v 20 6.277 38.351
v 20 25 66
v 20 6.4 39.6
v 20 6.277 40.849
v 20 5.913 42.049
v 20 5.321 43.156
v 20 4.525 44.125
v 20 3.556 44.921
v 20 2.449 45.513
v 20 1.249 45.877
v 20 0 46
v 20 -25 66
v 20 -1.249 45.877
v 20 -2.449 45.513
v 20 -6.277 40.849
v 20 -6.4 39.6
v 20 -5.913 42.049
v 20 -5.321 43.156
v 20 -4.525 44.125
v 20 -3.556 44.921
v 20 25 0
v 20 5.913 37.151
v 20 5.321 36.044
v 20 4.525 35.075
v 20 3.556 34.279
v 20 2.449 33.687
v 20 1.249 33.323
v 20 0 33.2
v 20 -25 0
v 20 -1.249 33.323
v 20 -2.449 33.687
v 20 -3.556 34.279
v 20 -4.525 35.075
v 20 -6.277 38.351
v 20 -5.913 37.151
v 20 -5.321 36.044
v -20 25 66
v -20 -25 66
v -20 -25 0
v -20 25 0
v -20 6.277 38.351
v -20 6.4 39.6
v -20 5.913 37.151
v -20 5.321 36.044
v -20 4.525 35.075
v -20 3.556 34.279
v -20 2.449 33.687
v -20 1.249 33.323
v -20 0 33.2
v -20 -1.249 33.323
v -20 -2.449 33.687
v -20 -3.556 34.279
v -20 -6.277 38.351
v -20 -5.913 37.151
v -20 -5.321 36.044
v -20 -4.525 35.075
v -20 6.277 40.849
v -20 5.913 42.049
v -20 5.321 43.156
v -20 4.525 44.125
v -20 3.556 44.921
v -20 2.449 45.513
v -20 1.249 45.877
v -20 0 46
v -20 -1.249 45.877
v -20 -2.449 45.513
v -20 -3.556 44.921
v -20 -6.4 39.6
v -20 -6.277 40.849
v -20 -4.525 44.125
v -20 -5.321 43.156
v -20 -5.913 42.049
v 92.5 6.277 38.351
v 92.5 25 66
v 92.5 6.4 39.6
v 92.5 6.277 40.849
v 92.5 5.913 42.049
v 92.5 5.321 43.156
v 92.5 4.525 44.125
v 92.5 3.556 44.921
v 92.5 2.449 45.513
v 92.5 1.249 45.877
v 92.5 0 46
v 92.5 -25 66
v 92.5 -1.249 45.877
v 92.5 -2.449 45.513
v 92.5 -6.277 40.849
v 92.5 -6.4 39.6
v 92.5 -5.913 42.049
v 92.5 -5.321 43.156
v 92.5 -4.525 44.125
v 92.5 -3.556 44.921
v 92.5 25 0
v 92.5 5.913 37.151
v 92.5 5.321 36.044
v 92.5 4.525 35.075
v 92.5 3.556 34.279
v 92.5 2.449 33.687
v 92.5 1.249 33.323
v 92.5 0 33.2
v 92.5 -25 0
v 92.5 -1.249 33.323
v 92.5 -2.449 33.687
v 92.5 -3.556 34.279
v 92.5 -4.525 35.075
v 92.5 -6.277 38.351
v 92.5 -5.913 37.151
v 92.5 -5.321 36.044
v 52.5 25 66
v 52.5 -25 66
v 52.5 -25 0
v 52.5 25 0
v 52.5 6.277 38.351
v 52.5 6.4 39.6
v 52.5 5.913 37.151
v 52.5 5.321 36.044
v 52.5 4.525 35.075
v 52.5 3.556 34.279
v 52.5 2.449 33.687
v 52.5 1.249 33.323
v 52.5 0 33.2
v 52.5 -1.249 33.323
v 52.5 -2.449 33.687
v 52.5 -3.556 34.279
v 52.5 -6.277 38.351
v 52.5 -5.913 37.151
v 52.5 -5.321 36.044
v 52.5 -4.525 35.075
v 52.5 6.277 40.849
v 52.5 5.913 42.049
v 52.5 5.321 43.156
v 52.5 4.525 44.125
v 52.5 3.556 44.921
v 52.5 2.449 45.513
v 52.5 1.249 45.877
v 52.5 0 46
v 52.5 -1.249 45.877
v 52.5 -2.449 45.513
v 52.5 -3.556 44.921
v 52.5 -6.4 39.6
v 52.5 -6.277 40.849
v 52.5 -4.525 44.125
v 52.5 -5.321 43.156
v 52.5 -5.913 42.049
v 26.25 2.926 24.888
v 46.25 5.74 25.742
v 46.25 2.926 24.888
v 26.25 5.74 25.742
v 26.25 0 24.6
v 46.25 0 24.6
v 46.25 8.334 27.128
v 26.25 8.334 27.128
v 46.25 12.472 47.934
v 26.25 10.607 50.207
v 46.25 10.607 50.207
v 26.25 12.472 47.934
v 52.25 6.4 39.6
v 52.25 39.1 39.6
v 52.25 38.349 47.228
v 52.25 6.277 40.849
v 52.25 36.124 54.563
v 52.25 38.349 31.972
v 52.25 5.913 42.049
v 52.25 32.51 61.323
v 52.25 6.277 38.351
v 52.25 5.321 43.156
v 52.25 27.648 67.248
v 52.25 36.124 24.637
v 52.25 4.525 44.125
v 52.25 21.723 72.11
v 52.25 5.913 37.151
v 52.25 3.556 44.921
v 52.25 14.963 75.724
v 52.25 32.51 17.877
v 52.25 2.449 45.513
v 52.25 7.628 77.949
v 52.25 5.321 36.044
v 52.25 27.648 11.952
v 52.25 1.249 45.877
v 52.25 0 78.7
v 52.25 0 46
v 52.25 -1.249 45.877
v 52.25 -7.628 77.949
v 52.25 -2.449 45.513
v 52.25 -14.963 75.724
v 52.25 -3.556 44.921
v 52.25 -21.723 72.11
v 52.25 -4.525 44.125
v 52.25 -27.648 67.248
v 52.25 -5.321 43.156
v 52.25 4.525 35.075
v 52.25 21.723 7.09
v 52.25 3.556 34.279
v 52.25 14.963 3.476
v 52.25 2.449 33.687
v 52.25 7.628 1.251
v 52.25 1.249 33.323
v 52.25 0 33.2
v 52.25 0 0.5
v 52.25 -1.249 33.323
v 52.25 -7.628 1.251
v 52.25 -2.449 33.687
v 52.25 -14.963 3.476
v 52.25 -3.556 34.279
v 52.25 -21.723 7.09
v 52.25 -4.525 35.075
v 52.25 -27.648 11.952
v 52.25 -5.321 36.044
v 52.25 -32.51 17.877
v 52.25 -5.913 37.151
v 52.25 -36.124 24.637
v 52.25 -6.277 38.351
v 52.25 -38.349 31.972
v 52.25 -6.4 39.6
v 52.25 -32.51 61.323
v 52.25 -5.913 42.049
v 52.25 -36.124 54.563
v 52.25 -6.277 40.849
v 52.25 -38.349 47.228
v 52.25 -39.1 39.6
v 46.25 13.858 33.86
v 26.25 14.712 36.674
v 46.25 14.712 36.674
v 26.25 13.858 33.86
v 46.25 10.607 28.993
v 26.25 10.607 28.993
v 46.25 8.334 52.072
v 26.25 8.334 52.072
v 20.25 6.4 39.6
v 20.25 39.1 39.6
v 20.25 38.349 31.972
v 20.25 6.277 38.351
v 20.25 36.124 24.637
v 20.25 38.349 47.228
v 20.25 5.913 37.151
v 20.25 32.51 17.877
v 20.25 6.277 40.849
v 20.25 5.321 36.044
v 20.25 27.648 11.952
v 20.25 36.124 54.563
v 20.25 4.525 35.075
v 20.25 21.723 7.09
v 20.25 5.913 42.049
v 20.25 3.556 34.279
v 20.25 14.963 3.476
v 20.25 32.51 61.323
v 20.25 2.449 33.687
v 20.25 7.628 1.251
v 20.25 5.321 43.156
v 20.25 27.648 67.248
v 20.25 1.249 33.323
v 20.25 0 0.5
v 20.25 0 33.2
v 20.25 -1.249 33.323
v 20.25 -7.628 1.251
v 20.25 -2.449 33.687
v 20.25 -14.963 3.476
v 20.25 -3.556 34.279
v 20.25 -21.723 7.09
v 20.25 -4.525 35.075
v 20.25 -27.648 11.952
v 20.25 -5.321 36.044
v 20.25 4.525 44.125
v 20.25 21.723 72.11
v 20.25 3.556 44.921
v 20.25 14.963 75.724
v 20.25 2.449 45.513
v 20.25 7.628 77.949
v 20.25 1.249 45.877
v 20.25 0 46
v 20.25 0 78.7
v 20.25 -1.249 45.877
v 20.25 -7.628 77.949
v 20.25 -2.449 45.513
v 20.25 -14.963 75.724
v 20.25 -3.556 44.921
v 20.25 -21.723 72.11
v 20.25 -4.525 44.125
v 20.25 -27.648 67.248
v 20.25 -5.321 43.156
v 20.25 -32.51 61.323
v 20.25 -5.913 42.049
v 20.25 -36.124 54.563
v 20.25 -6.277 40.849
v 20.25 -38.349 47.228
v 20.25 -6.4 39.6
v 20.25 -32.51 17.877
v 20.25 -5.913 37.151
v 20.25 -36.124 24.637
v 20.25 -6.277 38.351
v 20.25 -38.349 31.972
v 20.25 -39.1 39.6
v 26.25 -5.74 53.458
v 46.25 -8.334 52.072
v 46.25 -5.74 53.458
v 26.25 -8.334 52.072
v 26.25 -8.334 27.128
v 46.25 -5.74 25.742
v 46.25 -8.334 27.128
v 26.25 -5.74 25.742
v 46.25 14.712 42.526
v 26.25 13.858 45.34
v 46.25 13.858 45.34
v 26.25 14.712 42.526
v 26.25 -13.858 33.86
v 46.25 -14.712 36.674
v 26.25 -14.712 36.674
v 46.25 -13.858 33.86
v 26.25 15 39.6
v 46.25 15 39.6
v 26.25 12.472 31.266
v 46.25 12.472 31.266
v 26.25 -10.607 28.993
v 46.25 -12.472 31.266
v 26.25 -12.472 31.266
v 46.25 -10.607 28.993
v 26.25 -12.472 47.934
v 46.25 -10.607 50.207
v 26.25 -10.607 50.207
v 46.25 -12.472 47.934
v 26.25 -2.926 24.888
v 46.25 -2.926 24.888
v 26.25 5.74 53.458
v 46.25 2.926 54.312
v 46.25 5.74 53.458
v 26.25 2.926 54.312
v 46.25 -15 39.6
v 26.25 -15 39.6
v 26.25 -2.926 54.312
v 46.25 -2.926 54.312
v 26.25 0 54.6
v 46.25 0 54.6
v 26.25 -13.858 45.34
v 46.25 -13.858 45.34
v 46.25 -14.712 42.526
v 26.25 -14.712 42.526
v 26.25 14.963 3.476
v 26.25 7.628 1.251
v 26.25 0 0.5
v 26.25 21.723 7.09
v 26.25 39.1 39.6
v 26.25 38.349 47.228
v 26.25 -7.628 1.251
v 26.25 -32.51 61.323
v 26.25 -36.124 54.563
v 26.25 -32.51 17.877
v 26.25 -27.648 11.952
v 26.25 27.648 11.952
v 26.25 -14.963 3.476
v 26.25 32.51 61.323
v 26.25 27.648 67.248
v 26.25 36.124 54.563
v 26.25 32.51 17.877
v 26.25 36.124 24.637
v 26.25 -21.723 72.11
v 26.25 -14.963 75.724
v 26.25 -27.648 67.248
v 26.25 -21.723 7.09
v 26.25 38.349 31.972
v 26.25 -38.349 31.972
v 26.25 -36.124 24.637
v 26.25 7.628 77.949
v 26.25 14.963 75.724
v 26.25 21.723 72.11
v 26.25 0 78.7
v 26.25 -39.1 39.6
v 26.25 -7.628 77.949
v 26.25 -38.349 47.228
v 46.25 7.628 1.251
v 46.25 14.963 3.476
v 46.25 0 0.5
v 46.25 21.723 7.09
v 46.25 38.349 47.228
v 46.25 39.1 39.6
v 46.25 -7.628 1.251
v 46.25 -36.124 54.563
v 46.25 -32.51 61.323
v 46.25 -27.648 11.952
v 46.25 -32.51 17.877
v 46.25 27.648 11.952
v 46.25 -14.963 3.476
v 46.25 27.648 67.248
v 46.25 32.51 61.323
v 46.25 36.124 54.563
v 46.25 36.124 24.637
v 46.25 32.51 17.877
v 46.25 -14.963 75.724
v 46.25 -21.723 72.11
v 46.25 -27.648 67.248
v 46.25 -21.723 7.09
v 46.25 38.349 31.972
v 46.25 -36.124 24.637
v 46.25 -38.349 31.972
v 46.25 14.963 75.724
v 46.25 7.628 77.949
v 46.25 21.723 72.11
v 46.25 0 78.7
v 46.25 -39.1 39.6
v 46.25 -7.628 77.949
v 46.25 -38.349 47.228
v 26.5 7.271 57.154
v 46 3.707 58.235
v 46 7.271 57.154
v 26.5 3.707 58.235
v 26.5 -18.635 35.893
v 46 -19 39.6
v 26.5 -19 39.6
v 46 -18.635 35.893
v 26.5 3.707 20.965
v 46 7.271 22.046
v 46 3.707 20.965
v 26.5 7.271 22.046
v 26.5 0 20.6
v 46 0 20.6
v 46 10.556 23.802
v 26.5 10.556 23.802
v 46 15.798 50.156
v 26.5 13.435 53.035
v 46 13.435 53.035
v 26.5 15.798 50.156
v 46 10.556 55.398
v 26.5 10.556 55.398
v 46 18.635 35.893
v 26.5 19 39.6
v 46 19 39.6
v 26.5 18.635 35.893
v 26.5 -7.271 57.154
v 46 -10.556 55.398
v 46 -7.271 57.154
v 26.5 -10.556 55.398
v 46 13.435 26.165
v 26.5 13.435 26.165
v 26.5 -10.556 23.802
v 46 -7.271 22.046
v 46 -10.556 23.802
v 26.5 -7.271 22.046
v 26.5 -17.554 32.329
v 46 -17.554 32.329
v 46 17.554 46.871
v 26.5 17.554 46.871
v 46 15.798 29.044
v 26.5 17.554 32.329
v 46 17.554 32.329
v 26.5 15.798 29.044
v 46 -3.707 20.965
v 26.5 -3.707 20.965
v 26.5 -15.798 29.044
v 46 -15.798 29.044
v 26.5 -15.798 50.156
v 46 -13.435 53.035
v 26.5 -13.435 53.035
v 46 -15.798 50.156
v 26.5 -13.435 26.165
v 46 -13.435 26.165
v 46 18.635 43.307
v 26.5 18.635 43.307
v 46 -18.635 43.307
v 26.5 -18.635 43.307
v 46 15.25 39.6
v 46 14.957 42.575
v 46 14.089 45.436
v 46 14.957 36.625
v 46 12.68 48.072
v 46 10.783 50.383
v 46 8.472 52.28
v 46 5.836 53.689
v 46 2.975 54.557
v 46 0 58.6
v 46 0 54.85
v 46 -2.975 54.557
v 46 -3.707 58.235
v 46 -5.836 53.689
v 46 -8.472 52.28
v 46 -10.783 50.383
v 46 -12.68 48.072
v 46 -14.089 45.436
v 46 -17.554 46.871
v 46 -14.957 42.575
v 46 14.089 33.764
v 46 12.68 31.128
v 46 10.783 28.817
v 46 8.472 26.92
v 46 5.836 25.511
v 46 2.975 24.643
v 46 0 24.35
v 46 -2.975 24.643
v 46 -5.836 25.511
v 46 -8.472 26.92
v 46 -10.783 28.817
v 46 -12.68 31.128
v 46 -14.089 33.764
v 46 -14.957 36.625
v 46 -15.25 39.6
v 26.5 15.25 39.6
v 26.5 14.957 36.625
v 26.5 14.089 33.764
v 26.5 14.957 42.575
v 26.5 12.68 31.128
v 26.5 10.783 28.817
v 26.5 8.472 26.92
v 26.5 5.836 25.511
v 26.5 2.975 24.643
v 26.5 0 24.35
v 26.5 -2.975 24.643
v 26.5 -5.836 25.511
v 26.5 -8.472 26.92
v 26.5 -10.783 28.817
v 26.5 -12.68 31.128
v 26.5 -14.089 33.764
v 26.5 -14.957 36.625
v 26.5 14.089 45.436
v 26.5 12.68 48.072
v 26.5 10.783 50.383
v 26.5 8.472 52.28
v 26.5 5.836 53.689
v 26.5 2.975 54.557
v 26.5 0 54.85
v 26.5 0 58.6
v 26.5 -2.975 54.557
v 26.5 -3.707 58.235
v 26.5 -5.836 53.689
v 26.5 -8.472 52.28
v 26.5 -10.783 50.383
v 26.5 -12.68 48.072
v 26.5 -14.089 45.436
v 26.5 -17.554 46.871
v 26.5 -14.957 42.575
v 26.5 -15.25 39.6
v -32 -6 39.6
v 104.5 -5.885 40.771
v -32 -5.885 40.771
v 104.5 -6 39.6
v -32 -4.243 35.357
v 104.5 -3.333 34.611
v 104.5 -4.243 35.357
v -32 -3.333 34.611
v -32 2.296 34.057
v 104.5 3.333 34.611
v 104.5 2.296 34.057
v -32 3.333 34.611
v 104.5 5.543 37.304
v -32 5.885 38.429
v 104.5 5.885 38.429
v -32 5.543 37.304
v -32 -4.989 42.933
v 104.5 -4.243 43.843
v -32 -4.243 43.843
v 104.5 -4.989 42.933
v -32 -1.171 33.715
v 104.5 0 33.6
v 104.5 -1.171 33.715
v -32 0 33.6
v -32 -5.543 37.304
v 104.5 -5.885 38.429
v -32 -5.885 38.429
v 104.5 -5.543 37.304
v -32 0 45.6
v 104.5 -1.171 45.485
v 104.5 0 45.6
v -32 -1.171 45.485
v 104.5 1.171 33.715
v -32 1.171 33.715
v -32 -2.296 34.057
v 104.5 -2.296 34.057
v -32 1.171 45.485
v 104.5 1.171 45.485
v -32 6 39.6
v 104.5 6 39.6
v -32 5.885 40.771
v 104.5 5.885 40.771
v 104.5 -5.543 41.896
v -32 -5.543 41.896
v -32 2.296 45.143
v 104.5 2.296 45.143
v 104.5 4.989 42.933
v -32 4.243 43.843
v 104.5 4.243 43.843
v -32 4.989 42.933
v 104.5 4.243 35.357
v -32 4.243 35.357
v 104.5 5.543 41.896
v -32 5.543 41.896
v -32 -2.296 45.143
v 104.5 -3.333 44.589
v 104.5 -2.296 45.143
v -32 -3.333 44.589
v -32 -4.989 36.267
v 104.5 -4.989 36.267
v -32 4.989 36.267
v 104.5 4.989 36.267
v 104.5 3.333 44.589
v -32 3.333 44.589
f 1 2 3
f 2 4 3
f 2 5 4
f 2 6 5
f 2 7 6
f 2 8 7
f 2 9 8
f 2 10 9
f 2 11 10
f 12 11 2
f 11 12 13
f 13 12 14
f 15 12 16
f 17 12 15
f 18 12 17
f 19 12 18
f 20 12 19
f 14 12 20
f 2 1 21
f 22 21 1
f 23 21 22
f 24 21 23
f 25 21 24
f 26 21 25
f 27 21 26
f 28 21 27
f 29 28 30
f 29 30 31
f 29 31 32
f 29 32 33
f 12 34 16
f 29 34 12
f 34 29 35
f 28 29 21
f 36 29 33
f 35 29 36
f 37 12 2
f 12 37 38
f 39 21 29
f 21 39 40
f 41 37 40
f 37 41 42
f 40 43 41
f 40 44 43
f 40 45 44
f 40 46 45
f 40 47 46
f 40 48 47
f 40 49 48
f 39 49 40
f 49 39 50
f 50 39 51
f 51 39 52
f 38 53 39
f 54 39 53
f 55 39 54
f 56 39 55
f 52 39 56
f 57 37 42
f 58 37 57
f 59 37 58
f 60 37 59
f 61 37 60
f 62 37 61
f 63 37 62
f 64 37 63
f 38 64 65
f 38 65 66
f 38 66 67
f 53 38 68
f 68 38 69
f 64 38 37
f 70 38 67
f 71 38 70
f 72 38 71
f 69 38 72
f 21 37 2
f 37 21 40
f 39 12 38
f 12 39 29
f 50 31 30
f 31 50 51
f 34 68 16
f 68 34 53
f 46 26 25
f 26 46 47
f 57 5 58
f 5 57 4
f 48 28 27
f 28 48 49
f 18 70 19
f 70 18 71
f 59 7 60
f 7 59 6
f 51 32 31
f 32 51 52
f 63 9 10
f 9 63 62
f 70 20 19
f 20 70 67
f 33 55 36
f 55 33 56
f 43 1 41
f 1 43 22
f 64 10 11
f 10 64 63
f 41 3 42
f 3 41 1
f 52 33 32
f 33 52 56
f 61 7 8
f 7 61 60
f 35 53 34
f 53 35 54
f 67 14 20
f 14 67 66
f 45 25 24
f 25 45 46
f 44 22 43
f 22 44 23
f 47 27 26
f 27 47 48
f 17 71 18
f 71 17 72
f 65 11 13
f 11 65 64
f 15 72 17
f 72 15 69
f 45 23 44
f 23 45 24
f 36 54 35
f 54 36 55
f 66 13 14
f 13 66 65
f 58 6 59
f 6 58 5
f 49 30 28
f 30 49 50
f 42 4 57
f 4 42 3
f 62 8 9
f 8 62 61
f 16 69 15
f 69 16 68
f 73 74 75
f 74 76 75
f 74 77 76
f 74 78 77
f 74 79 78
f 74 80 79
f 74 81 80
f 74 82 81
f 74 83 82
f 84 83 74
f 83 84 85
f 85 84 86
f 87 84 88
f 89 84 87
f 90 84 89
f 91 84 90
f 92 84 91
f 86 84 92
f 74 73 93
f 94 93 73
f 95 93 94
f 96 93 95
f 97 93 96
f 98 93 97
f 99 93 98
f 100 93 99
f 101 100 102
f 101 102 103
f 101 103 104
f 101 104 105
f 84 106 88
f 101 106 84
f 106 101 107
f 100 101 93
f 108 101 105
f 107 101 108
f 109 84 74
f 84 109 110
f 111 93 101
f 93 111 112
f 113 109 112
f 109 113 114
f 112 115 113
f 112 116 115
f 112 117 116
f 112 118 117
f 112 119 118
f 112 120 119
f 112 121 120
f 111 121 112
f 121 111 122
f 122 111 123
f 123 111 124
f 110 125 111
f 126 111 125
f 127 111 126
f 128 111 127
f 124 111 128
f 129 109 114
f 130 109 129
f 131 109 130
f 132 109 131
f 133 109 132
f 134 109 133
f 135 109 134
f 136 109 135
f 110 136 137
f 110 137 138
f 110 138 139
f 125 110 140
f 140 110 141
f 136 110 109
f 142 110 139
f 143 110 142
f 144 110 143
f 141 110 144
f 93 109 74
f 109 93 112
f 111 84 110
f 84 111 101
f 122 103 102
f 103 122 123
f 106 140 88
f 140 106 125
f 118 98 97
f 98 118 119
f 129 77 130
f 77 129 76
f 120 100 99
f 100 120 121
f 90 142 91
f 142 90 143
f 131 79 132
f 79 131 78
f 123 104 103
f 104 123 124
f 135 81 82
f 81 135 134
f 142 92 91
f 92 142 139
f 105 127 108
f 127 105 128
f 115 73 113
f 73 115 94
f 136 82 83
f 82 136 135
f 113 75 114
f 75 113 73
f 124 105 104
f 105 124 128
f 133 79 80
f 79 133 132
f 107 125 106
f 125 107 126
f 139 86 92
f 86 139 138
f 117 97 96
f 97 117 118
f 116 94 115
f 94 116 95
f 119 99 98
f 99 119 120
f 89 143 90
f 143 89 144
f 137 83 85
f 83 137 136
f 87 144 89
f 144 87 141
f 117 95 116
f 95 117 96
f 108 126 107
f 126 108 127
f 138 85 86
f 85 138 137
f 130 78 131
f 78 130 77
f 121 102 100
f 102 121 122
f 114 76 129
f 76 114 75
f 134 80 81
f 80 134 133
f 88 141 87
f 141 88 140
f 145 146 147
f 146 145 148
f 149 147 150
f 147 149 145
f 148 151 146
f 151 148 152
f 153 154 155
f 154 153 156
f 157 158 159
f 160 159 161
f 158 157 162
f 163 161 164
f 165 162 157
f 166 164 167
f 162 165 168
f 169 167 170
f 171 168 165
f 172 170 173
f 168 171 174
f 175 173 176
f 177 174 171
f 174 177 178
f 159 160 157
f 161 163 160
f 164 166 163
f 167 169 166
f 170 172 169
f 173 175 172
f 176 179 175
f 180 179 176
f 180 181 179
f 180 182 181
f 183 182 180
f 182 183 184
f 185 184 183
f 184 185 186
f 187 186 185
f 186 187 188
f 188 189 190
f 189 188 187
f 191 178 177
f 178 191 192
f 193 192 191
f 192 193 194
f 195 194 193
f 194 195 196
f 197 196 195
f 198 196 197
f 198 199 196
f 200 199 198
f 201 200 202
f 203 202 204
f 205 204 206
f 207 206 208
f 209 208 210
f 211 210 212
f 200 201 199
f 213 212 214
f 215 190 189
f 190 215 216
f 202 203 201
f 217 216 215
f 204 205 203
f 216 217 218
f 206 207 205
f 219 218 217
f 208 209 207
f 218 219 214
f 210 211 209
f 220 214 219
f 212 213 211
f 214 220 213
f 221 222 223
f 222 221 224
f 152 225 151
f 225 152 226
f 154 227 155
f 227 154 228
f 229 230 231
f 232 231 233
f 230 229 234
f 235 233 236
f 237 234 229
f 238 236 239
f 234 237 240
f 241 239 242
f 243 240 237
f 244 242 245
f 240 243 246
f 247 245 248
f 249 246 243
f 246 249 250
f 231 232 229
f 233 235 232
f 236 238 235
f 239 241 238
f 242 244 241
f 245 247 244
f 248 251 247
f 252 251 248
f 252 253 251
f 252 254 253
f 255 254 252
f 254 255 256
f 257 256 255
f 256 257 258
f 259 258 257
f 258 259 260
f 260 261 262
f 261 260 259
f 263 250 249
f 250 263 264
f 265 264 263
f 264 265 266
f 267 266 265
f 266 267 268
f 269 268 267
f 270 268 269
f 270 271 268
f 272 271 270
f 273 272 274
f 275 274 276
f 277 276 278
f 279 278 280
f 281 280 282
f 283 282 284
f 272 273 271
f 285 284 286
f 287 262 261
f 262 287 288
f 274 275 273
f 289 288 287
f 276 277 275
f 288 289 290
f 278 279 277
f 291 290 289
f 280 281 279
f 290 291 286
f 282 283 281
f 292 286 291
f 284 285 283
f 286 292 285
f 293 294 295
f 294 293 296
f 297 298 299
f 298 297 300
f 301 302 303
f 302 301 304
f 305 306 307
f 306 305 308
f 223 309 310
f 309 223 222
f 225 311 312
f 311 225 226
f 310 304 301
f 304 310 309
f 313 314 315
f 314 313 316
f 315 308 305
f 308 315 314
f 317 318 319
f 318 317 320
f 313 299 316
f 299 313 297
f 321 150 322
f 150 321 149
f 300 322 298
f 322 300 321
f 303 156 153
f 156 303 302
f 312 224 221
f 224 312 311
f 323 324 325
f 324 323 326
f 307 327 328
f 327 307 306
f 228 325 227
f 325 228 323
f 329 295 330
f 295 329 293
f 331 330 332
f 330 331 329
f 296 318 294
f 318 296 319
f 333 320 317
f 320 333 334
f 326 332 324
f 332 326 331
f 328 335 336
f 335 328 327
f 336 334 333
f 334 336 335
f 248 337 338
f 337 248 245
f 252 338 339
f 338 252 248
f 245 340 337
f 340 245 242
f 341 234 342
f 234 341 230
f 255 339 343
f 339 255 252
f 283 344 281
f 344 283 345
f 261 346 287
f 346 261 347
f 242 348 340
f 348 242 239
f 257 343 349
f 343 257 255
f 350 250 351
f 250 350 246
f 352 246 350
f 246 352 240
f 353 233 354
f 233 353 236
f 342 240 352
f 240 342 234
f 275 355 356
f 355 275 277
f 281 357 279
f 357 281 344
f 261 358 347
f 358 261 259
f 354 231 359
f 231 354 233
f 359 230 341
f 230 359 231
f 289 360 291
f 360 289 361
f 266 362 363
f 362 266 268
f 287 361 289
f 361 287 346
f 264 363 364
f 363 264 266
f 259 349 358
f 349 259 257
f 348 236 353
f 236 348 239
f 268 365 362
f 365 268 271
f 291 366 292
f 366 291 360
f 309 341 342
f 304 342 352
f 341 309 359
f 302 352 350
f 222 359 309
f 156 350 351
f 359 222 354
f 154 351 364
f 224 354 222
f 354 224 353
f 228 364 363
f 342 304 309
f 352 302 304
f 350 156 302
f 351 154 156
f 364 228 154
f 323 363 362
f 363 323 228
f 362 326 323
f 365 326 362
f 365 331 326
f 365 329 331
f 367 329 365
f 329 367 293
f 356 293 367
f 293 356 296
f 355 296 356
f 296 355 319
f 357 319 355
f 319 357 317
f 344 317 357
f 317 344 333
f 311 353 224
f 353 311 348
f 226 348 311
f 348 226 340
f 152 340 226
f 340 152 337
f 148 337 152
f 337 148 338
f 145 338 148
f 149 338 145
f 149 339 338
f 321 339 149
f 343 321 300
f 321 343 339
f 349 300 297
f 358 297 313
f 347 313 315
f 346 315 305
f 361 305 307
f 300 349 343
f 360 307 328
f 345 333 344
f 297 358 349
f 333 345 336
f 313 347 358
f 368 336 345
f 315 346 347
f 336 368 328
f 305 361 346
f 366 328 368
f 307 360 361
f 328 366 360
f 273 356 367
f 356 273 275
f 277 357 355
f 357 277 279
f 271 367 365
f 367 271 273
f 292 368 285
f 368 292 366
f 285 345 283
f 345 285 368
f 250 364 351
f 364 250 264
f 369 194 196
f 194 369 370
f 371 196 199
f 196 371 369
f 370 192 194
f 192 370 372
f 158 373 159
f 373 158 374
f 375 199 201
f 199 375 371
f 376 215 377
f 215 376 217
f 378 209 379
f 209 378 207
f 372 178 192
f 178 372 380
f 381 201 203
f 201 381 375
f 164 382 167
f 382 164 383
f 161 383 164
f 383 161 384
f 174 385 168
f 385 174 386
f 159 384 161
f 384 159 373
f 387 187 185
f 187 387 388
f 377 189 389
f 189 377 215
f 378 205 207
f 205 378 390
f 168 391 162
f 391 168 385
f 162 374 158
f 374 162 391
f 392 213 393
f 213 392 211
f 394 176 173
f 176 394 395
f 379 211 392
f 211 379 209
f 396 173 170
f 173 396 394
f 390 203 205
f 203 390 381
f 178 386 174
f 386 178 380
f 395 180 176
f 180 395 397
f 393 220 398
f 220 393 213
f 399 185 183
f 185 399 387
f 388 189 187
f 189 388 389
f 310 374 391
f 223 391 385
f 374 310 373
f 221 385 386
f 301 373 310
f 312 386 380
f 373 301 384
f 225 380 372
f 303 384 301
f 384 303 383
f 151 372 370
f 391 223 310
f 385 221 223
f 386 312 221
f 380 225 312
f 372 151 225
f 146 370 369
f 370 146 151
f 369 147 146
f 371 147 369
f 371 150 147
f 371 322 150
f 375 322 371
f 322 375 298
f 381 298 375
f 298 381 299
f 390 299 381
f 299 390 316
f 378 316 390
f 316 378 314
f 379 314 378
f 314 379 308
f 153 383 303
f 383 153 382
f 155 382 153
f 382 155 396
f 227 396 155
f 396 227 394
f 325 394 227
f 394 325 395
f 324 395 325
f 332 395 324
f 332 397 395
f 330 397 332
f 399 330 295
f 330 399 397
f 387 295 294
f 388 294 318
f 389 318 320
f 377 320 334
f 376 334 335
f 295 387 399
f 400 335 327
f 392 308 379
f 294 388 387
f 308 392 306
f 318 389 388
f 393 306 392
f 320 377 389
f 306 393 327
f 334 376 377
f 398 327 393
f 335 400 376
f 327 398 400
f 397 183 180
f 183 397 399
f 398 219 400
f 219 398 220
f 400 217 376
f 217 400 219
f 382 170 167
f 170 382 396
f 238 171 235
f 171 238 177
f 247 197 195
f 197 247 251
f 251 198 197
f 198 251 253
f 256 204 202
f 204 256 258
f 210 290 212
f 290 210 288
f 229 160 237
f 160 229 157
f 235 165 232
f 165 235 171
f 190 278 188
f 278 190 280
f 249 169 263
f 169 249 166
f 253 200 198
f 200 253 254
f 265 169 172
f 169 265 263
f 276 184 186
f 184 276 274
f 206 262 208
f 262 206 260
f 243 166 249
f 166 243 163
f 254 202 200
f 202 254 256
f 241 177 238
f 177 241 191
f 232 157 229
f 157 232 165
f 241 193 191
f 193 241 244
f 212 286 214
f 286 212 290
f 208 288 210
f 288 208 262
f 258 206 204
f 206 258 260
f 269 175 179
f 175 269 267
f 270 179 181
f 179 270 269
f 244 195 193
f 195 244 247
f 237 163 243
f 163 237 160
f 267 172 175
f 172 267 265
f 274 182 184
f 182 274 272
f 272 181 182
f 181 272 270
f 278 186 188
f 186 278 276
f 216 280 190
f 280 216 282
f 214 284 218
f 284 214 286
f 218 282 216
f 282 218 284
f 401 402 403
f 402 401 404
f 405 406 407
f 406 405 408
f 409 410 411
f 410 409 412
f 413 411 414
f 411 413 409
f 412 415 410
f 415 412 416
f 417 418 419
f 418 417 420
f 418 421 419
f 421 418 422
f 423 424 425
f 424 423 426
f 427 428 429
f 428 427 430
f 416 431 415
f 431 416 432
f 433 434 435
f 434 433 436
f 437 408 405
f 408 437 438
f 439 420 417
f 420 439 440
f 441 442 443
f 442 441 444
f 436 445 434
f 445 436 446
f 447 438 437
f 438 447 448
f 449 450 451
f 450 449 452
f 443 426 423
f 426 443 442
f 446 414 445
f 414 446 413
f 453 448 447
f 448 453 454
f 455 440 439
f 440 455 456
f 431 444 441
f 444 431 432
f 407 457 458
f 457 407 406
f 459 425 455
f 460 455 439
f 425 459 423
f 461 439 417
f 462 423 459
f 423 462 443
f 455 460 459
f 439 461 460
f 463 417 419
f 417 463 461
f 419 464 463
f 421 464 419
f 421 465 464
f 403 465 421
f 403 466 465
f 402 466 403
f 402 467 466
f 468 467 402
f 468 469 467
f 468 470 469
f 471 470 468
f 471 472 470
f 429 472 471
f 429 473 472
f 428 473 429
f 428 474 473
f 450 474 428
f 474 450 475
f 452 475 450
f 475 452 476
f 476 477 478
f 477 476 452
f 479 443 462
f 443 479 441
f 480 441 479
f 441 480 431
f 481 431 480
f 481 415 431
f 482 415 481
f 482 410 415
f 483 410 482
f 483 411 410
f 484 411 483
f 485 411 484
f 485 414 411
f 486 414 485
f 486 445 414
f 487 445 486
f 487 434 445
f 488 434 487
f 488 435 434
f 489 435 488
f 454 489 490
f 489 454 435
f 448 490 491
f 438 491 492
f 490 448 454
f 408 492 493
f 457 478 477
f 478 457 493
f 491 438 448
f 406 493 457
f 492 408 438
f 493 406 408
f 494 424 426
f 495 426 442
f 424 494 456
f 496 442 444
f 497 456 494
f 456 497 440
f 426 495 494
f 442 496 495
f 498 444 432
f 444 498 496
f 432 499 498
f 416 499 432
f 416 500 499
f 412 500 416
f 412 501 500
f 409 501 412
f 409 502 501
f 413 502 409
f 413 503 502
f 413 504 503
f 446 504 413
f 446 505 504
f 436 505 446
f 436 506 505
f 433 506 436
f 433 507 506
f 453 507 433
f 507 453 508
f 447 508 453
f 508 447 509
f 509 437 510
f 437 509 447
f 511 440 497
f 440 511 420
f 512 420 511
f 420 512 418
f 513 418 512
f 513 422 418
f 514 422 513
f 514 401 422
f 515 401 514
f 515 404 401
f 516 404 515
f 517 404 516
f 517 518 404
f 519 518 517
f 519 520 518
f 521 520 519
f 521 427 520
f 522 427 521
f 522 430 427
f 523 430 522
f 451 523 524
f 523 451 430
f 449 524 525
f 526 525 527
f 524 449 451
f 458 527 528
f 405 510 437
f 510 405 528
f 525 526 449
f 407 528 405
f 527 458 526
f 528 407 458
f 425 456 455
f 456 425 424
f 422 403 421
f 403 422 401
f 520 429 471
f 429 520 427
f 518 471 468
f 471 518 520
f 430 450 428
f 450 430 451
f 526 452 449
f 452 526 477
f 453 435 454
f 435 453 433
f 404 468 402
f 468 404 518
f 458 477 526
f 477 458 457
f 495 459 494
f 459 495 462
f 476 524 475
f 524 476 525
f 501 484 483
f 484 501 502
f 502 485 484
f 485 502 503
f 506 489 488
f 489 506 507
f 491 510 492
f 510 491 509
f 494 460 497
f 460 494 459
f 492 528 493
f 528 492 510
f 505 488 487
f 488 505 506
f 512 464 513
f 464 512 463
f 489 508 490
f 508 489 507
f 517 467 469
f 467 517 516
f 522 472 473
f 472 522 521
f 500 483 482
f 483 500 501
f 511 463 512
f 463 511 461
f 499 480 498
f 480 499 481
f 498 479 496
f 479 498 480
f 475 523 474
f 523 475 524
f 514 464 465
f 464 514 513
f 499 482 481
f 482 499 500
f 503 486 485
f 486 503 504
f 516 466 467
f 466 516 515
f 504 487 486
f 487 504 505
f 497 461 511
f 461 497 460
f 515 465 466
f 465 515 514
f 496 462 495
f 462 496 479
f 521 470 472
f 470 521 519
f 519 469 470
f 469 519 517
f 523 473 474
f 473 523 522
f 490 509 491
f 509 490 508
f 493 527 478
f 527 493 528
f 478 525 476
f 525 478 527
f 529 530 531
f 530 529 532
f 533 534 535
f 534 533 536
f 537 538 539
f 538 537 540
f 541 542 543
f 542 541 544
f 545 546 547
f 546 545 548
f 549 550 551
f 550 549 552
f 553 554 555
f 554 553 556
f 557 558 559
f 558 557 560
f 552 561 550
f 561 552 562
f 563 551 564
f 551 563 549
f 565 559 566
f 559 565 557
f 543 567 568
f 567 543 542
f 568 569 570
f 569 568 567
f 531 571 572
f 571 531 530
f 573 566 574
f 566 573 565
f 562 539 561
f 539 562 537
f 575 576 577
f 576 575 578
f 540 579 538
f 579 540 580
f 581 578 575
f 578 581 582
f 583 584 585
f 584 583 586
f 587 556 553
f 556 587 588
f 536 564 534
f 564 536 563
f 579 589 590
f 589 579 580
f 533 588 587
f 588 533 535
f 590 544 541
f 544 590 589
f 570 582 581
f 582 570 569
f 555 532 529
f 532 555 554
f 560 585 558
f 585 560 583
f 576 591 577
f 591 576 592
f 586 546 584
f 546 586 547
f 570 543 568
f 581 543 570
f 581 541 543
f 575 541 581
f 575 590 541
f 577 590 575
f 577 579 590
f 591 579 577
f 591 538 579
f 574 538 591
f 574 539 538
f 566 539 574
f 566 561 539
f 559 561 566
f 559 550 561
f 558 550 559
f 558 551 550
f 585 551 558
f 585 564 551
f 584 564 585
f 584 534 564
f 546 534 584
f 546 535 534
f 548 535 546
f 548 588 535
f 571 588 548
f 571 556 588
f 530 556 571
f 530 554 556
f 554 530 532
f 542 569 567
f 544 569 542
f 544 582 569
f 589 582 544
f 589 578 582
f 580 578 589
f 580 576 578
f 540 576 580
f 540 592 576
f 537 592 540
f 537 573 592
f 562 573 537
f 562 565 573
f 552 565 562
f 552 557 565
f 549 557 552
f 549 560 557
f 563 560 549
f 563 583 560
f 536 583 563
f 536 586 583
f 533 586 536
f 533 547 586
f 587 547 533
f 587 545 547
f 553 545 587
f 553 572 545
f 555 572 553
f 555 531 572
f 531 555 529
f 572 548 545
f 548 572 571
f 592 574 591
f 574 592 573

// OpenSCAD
$fn = 32;

// ------------------------------------------------------------------------
// Pulley assembly: d78.2 pulley with a belt, shaft d12
// Every part is its own module, assembly() places them once.
// ------------------------------------------------------------------------

// --- part 1 ---
module support1() {
  difference() {
    translate([-20, -25, 0]) cube([40, 50, 66]);
    translate([0, 0, 39.6]) rotate([0, 90, 0]) cylinder(h = 42, d = 12.8, center = true);
  }
}

// --- part 2 ---
module support2() {
  difference() {
    translate([-20, -25, 0]) cube([40, 50, 66]);
    translate([0, 0, 39.6]) rotate([0, 90, 0]) cylinder(h = 42, d = 12.8, center = true);
  }
}

// --- part 3 ---
module shaft() {
  translate([0, 0, -68.25]) cylinder(h = 136.5, d = 12);
}

// --- part 4 ---
module pulley() {
  difference() {
    union() {
      cylinder(h = 32, d = 30);
      cylinder(h = 6, d = 78.2);
      translate([0, 0, 26]) cylinder(h = 6, d = 78.2);
    }
    translate([0, 0, -1]) cylinder(h = 34, d = 12.8);
  }
}

// --- part 5 ---
module belt() {
  difference() {
      translate([0, 0, 0]) cylinder(h = 19.5, d = 38);
      translate([0, 0, -1]) cylinder(h = 21.5, d = 30.5);
    }
}

// --- assembly ---
module assembly() {
  translate([0, 0, 0]) rotate([0, 0, 0]) support1();
  translate([72.5, 0, 0]) rotate([0, 0, 0]) support2();
  translate([36.25, 0, 39.6]) rotate([0, 90, 0]) shaft();
  translate([20.25, 0, 39.6]) rotate([0, 90, 0]) pulley();
  translate([26.5, 0, 39.6]) rotate([0, 90, 0]) belt();
}

assembly();
